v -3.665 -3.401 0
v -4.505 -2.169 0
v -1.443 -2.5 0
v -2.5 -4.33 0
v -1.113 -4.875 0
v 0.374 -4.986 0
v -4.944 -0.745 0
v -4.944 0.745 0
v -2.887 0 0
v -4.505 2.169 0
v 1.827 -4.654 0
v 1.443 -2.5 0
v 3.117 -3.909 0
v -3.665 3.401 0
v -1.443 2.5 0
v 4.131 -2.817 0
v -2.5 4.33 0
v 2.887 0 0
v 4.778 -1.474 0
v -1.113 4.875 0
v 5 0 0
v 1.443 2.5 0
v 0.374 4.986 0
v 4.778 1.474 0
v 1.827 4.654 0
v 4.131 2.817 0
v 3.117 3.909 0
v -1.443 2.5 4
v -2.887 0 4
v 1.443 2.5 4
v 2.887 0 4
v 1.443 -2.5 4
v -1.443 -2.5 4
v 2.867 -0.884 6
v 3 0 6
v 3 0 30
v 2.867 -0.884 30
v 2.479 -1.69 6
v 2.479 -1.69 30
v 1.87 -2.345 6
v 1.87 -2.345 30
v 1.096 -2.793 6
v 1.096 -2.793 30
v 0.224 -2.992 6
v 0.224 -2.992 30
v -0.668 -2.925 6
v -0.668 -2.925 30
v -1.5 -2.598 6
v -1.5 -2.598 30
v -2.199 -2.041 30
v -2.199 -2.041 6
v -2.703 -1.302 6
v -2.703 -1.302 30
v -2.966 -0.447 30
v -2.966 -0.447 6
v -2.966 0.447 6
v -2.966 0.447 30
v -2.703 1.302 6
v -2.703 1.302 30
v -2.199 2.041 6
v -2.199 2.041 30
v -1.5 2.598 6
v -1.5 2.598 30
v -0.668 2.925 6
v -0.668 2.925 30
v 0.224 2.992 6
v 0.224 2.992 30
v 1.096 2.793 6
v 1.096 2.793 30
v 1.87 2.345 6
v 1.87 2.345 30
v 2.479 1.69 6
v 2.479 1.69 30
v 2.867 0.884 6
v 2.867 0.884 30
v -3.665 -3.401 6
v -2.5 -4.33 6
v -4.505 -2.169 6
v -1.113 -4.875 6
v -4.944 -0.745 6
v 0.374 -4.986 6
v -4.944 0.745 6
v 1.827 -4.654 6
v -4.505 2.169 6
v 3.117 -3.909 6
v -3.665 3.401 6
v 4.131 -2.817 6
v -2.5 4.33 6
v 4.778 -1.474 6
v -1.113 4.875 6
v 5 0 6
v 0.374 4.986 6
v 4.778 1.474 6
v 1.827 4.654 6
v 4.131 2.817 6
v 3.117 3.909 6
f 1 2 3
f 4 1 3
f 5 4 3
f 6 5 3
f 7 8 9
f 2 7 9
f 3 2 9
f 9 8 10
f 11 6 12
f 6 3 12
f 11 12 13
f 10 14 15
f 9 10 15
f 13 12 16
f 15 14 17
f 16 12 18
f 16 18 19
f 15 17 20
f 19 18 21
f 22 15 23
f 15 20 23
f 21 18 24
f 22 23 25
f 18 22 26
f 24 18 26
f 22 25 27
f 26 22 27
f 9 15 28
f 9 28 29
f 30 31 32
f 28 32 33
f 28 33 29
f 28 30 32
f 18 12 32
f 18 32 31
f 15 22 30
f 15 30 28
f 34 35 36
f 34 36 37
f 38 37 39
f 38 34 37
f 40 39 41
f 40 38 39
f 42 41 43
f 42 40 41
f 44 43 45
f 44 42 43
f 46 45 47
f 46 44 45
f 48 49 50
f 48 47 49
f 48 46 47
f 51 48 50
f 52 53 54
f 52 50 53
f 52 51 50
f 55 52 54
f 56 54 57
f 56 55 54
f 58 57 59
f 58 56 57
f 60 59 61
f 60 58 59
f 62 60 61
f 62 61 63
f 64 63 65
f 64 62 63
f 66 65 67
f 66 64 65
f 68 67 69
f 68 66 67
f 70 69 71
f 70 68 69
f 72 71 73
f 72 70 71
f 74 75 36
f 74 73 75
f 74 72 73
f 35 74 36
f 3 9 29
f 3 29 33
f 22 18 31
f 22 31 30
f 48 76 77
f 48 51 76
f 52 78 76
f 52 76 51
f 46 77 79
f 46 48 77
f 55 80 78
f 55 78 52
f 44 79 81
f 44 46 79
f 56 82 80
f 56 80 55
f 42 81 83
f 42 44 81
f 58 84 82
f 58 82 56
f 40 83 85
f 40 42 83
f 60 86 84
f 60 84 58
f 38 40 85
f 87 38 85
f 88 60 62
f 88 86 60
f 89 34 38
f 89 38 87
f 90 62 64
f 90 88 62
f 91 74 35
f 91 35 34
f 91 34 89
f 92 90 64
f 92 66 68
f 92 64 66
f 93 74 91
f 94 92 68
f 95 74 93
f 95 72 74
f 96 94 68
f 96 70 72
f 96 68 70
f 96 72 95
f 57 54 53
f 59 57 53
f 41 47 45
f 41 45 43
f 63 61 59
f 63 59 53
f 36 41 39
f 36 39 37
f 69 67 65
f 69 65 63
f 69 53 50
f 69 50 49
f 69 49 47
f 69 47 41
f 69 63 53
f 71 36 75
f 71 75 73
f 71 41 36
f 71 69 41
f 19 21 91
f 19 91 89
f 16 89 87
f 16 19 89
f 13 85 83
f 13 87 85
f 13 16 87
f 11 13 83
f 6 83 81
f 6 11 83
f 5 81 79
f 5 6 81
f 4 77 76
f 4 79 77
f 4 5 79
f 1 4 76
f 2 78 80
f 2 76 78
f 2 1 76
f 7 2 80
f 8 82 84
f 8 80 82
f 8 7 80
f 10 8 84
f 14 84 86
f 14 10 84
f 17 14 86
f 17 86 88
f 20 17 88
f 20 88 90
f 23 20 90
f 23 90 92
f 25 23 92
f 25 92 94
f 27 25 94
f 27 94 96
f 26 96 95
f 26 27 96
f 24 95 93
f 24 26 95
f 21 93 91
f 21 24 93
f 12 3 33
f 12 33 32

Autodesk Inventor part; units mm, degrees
ref_plane "YZ Plane" through (0, 0, 0) normal (1, 0, 0) x (0, 1, 0)
ref_plane "XZ Plane" through (0, 0, 0) normal (0, 1, 0) x (-1, 0, 0)
ref_plane "XY Plane" through (0, 0, 0) normal (0, 0, 1) x (1, 0, 0)
sketch "Sketch1" plane through (0, 0, 0) normal (0, 0, 1) x (1, 0, 0)
  circle A0 centre (0, 0) radius 5
  dimension "d0" = 10
extrude "Extrusion1" add sketch "Sketch1" along normal blind 6
sketch "Sketch2" plane through (0, 0, 6) normal (0, 0, 1) x (1, 0, 0)
  circle A0 centre (0, 0) radius 5 projected
  circle A1 centre (0, 0) radius 3
  dimension "d3" = 6
extrude "Extrusion2" add sketch "Sketch2" along normal blind 24 contours A1
sketch "Sketch3" plane through (0, 0, 0) normal (0, 0, -1) x (-1, 0, 0)
  circle A0 centre (0, 0) radius 5 projected
  line L0 (2.8868, 0) -> (1.4434, -2.5)
  line L1 (1.4434, -2.5) -> (-1.4434, -2.5)
  line L2 (-1.4434, -2.5) -> (-2.8868, 0)
  line L3 (-2.8868, 0) -> (-1.4434, 2.5)
  line L4 (-1.4434, 2.5) -> (1.4434, 2.5)
  line L5 (1.4434, 2.5) -> (2.8868, 0)
  dimension "d6" = 5
extrude "Extrusion3" cut sketch "Sketch3" against normal blind 4 contours L0 L1 L2 L3 L4 L5
thread "Thread1" size "M6x1" class "6g" standard "ANSI Metric M Profile" full length
properties part number "m6x1"
